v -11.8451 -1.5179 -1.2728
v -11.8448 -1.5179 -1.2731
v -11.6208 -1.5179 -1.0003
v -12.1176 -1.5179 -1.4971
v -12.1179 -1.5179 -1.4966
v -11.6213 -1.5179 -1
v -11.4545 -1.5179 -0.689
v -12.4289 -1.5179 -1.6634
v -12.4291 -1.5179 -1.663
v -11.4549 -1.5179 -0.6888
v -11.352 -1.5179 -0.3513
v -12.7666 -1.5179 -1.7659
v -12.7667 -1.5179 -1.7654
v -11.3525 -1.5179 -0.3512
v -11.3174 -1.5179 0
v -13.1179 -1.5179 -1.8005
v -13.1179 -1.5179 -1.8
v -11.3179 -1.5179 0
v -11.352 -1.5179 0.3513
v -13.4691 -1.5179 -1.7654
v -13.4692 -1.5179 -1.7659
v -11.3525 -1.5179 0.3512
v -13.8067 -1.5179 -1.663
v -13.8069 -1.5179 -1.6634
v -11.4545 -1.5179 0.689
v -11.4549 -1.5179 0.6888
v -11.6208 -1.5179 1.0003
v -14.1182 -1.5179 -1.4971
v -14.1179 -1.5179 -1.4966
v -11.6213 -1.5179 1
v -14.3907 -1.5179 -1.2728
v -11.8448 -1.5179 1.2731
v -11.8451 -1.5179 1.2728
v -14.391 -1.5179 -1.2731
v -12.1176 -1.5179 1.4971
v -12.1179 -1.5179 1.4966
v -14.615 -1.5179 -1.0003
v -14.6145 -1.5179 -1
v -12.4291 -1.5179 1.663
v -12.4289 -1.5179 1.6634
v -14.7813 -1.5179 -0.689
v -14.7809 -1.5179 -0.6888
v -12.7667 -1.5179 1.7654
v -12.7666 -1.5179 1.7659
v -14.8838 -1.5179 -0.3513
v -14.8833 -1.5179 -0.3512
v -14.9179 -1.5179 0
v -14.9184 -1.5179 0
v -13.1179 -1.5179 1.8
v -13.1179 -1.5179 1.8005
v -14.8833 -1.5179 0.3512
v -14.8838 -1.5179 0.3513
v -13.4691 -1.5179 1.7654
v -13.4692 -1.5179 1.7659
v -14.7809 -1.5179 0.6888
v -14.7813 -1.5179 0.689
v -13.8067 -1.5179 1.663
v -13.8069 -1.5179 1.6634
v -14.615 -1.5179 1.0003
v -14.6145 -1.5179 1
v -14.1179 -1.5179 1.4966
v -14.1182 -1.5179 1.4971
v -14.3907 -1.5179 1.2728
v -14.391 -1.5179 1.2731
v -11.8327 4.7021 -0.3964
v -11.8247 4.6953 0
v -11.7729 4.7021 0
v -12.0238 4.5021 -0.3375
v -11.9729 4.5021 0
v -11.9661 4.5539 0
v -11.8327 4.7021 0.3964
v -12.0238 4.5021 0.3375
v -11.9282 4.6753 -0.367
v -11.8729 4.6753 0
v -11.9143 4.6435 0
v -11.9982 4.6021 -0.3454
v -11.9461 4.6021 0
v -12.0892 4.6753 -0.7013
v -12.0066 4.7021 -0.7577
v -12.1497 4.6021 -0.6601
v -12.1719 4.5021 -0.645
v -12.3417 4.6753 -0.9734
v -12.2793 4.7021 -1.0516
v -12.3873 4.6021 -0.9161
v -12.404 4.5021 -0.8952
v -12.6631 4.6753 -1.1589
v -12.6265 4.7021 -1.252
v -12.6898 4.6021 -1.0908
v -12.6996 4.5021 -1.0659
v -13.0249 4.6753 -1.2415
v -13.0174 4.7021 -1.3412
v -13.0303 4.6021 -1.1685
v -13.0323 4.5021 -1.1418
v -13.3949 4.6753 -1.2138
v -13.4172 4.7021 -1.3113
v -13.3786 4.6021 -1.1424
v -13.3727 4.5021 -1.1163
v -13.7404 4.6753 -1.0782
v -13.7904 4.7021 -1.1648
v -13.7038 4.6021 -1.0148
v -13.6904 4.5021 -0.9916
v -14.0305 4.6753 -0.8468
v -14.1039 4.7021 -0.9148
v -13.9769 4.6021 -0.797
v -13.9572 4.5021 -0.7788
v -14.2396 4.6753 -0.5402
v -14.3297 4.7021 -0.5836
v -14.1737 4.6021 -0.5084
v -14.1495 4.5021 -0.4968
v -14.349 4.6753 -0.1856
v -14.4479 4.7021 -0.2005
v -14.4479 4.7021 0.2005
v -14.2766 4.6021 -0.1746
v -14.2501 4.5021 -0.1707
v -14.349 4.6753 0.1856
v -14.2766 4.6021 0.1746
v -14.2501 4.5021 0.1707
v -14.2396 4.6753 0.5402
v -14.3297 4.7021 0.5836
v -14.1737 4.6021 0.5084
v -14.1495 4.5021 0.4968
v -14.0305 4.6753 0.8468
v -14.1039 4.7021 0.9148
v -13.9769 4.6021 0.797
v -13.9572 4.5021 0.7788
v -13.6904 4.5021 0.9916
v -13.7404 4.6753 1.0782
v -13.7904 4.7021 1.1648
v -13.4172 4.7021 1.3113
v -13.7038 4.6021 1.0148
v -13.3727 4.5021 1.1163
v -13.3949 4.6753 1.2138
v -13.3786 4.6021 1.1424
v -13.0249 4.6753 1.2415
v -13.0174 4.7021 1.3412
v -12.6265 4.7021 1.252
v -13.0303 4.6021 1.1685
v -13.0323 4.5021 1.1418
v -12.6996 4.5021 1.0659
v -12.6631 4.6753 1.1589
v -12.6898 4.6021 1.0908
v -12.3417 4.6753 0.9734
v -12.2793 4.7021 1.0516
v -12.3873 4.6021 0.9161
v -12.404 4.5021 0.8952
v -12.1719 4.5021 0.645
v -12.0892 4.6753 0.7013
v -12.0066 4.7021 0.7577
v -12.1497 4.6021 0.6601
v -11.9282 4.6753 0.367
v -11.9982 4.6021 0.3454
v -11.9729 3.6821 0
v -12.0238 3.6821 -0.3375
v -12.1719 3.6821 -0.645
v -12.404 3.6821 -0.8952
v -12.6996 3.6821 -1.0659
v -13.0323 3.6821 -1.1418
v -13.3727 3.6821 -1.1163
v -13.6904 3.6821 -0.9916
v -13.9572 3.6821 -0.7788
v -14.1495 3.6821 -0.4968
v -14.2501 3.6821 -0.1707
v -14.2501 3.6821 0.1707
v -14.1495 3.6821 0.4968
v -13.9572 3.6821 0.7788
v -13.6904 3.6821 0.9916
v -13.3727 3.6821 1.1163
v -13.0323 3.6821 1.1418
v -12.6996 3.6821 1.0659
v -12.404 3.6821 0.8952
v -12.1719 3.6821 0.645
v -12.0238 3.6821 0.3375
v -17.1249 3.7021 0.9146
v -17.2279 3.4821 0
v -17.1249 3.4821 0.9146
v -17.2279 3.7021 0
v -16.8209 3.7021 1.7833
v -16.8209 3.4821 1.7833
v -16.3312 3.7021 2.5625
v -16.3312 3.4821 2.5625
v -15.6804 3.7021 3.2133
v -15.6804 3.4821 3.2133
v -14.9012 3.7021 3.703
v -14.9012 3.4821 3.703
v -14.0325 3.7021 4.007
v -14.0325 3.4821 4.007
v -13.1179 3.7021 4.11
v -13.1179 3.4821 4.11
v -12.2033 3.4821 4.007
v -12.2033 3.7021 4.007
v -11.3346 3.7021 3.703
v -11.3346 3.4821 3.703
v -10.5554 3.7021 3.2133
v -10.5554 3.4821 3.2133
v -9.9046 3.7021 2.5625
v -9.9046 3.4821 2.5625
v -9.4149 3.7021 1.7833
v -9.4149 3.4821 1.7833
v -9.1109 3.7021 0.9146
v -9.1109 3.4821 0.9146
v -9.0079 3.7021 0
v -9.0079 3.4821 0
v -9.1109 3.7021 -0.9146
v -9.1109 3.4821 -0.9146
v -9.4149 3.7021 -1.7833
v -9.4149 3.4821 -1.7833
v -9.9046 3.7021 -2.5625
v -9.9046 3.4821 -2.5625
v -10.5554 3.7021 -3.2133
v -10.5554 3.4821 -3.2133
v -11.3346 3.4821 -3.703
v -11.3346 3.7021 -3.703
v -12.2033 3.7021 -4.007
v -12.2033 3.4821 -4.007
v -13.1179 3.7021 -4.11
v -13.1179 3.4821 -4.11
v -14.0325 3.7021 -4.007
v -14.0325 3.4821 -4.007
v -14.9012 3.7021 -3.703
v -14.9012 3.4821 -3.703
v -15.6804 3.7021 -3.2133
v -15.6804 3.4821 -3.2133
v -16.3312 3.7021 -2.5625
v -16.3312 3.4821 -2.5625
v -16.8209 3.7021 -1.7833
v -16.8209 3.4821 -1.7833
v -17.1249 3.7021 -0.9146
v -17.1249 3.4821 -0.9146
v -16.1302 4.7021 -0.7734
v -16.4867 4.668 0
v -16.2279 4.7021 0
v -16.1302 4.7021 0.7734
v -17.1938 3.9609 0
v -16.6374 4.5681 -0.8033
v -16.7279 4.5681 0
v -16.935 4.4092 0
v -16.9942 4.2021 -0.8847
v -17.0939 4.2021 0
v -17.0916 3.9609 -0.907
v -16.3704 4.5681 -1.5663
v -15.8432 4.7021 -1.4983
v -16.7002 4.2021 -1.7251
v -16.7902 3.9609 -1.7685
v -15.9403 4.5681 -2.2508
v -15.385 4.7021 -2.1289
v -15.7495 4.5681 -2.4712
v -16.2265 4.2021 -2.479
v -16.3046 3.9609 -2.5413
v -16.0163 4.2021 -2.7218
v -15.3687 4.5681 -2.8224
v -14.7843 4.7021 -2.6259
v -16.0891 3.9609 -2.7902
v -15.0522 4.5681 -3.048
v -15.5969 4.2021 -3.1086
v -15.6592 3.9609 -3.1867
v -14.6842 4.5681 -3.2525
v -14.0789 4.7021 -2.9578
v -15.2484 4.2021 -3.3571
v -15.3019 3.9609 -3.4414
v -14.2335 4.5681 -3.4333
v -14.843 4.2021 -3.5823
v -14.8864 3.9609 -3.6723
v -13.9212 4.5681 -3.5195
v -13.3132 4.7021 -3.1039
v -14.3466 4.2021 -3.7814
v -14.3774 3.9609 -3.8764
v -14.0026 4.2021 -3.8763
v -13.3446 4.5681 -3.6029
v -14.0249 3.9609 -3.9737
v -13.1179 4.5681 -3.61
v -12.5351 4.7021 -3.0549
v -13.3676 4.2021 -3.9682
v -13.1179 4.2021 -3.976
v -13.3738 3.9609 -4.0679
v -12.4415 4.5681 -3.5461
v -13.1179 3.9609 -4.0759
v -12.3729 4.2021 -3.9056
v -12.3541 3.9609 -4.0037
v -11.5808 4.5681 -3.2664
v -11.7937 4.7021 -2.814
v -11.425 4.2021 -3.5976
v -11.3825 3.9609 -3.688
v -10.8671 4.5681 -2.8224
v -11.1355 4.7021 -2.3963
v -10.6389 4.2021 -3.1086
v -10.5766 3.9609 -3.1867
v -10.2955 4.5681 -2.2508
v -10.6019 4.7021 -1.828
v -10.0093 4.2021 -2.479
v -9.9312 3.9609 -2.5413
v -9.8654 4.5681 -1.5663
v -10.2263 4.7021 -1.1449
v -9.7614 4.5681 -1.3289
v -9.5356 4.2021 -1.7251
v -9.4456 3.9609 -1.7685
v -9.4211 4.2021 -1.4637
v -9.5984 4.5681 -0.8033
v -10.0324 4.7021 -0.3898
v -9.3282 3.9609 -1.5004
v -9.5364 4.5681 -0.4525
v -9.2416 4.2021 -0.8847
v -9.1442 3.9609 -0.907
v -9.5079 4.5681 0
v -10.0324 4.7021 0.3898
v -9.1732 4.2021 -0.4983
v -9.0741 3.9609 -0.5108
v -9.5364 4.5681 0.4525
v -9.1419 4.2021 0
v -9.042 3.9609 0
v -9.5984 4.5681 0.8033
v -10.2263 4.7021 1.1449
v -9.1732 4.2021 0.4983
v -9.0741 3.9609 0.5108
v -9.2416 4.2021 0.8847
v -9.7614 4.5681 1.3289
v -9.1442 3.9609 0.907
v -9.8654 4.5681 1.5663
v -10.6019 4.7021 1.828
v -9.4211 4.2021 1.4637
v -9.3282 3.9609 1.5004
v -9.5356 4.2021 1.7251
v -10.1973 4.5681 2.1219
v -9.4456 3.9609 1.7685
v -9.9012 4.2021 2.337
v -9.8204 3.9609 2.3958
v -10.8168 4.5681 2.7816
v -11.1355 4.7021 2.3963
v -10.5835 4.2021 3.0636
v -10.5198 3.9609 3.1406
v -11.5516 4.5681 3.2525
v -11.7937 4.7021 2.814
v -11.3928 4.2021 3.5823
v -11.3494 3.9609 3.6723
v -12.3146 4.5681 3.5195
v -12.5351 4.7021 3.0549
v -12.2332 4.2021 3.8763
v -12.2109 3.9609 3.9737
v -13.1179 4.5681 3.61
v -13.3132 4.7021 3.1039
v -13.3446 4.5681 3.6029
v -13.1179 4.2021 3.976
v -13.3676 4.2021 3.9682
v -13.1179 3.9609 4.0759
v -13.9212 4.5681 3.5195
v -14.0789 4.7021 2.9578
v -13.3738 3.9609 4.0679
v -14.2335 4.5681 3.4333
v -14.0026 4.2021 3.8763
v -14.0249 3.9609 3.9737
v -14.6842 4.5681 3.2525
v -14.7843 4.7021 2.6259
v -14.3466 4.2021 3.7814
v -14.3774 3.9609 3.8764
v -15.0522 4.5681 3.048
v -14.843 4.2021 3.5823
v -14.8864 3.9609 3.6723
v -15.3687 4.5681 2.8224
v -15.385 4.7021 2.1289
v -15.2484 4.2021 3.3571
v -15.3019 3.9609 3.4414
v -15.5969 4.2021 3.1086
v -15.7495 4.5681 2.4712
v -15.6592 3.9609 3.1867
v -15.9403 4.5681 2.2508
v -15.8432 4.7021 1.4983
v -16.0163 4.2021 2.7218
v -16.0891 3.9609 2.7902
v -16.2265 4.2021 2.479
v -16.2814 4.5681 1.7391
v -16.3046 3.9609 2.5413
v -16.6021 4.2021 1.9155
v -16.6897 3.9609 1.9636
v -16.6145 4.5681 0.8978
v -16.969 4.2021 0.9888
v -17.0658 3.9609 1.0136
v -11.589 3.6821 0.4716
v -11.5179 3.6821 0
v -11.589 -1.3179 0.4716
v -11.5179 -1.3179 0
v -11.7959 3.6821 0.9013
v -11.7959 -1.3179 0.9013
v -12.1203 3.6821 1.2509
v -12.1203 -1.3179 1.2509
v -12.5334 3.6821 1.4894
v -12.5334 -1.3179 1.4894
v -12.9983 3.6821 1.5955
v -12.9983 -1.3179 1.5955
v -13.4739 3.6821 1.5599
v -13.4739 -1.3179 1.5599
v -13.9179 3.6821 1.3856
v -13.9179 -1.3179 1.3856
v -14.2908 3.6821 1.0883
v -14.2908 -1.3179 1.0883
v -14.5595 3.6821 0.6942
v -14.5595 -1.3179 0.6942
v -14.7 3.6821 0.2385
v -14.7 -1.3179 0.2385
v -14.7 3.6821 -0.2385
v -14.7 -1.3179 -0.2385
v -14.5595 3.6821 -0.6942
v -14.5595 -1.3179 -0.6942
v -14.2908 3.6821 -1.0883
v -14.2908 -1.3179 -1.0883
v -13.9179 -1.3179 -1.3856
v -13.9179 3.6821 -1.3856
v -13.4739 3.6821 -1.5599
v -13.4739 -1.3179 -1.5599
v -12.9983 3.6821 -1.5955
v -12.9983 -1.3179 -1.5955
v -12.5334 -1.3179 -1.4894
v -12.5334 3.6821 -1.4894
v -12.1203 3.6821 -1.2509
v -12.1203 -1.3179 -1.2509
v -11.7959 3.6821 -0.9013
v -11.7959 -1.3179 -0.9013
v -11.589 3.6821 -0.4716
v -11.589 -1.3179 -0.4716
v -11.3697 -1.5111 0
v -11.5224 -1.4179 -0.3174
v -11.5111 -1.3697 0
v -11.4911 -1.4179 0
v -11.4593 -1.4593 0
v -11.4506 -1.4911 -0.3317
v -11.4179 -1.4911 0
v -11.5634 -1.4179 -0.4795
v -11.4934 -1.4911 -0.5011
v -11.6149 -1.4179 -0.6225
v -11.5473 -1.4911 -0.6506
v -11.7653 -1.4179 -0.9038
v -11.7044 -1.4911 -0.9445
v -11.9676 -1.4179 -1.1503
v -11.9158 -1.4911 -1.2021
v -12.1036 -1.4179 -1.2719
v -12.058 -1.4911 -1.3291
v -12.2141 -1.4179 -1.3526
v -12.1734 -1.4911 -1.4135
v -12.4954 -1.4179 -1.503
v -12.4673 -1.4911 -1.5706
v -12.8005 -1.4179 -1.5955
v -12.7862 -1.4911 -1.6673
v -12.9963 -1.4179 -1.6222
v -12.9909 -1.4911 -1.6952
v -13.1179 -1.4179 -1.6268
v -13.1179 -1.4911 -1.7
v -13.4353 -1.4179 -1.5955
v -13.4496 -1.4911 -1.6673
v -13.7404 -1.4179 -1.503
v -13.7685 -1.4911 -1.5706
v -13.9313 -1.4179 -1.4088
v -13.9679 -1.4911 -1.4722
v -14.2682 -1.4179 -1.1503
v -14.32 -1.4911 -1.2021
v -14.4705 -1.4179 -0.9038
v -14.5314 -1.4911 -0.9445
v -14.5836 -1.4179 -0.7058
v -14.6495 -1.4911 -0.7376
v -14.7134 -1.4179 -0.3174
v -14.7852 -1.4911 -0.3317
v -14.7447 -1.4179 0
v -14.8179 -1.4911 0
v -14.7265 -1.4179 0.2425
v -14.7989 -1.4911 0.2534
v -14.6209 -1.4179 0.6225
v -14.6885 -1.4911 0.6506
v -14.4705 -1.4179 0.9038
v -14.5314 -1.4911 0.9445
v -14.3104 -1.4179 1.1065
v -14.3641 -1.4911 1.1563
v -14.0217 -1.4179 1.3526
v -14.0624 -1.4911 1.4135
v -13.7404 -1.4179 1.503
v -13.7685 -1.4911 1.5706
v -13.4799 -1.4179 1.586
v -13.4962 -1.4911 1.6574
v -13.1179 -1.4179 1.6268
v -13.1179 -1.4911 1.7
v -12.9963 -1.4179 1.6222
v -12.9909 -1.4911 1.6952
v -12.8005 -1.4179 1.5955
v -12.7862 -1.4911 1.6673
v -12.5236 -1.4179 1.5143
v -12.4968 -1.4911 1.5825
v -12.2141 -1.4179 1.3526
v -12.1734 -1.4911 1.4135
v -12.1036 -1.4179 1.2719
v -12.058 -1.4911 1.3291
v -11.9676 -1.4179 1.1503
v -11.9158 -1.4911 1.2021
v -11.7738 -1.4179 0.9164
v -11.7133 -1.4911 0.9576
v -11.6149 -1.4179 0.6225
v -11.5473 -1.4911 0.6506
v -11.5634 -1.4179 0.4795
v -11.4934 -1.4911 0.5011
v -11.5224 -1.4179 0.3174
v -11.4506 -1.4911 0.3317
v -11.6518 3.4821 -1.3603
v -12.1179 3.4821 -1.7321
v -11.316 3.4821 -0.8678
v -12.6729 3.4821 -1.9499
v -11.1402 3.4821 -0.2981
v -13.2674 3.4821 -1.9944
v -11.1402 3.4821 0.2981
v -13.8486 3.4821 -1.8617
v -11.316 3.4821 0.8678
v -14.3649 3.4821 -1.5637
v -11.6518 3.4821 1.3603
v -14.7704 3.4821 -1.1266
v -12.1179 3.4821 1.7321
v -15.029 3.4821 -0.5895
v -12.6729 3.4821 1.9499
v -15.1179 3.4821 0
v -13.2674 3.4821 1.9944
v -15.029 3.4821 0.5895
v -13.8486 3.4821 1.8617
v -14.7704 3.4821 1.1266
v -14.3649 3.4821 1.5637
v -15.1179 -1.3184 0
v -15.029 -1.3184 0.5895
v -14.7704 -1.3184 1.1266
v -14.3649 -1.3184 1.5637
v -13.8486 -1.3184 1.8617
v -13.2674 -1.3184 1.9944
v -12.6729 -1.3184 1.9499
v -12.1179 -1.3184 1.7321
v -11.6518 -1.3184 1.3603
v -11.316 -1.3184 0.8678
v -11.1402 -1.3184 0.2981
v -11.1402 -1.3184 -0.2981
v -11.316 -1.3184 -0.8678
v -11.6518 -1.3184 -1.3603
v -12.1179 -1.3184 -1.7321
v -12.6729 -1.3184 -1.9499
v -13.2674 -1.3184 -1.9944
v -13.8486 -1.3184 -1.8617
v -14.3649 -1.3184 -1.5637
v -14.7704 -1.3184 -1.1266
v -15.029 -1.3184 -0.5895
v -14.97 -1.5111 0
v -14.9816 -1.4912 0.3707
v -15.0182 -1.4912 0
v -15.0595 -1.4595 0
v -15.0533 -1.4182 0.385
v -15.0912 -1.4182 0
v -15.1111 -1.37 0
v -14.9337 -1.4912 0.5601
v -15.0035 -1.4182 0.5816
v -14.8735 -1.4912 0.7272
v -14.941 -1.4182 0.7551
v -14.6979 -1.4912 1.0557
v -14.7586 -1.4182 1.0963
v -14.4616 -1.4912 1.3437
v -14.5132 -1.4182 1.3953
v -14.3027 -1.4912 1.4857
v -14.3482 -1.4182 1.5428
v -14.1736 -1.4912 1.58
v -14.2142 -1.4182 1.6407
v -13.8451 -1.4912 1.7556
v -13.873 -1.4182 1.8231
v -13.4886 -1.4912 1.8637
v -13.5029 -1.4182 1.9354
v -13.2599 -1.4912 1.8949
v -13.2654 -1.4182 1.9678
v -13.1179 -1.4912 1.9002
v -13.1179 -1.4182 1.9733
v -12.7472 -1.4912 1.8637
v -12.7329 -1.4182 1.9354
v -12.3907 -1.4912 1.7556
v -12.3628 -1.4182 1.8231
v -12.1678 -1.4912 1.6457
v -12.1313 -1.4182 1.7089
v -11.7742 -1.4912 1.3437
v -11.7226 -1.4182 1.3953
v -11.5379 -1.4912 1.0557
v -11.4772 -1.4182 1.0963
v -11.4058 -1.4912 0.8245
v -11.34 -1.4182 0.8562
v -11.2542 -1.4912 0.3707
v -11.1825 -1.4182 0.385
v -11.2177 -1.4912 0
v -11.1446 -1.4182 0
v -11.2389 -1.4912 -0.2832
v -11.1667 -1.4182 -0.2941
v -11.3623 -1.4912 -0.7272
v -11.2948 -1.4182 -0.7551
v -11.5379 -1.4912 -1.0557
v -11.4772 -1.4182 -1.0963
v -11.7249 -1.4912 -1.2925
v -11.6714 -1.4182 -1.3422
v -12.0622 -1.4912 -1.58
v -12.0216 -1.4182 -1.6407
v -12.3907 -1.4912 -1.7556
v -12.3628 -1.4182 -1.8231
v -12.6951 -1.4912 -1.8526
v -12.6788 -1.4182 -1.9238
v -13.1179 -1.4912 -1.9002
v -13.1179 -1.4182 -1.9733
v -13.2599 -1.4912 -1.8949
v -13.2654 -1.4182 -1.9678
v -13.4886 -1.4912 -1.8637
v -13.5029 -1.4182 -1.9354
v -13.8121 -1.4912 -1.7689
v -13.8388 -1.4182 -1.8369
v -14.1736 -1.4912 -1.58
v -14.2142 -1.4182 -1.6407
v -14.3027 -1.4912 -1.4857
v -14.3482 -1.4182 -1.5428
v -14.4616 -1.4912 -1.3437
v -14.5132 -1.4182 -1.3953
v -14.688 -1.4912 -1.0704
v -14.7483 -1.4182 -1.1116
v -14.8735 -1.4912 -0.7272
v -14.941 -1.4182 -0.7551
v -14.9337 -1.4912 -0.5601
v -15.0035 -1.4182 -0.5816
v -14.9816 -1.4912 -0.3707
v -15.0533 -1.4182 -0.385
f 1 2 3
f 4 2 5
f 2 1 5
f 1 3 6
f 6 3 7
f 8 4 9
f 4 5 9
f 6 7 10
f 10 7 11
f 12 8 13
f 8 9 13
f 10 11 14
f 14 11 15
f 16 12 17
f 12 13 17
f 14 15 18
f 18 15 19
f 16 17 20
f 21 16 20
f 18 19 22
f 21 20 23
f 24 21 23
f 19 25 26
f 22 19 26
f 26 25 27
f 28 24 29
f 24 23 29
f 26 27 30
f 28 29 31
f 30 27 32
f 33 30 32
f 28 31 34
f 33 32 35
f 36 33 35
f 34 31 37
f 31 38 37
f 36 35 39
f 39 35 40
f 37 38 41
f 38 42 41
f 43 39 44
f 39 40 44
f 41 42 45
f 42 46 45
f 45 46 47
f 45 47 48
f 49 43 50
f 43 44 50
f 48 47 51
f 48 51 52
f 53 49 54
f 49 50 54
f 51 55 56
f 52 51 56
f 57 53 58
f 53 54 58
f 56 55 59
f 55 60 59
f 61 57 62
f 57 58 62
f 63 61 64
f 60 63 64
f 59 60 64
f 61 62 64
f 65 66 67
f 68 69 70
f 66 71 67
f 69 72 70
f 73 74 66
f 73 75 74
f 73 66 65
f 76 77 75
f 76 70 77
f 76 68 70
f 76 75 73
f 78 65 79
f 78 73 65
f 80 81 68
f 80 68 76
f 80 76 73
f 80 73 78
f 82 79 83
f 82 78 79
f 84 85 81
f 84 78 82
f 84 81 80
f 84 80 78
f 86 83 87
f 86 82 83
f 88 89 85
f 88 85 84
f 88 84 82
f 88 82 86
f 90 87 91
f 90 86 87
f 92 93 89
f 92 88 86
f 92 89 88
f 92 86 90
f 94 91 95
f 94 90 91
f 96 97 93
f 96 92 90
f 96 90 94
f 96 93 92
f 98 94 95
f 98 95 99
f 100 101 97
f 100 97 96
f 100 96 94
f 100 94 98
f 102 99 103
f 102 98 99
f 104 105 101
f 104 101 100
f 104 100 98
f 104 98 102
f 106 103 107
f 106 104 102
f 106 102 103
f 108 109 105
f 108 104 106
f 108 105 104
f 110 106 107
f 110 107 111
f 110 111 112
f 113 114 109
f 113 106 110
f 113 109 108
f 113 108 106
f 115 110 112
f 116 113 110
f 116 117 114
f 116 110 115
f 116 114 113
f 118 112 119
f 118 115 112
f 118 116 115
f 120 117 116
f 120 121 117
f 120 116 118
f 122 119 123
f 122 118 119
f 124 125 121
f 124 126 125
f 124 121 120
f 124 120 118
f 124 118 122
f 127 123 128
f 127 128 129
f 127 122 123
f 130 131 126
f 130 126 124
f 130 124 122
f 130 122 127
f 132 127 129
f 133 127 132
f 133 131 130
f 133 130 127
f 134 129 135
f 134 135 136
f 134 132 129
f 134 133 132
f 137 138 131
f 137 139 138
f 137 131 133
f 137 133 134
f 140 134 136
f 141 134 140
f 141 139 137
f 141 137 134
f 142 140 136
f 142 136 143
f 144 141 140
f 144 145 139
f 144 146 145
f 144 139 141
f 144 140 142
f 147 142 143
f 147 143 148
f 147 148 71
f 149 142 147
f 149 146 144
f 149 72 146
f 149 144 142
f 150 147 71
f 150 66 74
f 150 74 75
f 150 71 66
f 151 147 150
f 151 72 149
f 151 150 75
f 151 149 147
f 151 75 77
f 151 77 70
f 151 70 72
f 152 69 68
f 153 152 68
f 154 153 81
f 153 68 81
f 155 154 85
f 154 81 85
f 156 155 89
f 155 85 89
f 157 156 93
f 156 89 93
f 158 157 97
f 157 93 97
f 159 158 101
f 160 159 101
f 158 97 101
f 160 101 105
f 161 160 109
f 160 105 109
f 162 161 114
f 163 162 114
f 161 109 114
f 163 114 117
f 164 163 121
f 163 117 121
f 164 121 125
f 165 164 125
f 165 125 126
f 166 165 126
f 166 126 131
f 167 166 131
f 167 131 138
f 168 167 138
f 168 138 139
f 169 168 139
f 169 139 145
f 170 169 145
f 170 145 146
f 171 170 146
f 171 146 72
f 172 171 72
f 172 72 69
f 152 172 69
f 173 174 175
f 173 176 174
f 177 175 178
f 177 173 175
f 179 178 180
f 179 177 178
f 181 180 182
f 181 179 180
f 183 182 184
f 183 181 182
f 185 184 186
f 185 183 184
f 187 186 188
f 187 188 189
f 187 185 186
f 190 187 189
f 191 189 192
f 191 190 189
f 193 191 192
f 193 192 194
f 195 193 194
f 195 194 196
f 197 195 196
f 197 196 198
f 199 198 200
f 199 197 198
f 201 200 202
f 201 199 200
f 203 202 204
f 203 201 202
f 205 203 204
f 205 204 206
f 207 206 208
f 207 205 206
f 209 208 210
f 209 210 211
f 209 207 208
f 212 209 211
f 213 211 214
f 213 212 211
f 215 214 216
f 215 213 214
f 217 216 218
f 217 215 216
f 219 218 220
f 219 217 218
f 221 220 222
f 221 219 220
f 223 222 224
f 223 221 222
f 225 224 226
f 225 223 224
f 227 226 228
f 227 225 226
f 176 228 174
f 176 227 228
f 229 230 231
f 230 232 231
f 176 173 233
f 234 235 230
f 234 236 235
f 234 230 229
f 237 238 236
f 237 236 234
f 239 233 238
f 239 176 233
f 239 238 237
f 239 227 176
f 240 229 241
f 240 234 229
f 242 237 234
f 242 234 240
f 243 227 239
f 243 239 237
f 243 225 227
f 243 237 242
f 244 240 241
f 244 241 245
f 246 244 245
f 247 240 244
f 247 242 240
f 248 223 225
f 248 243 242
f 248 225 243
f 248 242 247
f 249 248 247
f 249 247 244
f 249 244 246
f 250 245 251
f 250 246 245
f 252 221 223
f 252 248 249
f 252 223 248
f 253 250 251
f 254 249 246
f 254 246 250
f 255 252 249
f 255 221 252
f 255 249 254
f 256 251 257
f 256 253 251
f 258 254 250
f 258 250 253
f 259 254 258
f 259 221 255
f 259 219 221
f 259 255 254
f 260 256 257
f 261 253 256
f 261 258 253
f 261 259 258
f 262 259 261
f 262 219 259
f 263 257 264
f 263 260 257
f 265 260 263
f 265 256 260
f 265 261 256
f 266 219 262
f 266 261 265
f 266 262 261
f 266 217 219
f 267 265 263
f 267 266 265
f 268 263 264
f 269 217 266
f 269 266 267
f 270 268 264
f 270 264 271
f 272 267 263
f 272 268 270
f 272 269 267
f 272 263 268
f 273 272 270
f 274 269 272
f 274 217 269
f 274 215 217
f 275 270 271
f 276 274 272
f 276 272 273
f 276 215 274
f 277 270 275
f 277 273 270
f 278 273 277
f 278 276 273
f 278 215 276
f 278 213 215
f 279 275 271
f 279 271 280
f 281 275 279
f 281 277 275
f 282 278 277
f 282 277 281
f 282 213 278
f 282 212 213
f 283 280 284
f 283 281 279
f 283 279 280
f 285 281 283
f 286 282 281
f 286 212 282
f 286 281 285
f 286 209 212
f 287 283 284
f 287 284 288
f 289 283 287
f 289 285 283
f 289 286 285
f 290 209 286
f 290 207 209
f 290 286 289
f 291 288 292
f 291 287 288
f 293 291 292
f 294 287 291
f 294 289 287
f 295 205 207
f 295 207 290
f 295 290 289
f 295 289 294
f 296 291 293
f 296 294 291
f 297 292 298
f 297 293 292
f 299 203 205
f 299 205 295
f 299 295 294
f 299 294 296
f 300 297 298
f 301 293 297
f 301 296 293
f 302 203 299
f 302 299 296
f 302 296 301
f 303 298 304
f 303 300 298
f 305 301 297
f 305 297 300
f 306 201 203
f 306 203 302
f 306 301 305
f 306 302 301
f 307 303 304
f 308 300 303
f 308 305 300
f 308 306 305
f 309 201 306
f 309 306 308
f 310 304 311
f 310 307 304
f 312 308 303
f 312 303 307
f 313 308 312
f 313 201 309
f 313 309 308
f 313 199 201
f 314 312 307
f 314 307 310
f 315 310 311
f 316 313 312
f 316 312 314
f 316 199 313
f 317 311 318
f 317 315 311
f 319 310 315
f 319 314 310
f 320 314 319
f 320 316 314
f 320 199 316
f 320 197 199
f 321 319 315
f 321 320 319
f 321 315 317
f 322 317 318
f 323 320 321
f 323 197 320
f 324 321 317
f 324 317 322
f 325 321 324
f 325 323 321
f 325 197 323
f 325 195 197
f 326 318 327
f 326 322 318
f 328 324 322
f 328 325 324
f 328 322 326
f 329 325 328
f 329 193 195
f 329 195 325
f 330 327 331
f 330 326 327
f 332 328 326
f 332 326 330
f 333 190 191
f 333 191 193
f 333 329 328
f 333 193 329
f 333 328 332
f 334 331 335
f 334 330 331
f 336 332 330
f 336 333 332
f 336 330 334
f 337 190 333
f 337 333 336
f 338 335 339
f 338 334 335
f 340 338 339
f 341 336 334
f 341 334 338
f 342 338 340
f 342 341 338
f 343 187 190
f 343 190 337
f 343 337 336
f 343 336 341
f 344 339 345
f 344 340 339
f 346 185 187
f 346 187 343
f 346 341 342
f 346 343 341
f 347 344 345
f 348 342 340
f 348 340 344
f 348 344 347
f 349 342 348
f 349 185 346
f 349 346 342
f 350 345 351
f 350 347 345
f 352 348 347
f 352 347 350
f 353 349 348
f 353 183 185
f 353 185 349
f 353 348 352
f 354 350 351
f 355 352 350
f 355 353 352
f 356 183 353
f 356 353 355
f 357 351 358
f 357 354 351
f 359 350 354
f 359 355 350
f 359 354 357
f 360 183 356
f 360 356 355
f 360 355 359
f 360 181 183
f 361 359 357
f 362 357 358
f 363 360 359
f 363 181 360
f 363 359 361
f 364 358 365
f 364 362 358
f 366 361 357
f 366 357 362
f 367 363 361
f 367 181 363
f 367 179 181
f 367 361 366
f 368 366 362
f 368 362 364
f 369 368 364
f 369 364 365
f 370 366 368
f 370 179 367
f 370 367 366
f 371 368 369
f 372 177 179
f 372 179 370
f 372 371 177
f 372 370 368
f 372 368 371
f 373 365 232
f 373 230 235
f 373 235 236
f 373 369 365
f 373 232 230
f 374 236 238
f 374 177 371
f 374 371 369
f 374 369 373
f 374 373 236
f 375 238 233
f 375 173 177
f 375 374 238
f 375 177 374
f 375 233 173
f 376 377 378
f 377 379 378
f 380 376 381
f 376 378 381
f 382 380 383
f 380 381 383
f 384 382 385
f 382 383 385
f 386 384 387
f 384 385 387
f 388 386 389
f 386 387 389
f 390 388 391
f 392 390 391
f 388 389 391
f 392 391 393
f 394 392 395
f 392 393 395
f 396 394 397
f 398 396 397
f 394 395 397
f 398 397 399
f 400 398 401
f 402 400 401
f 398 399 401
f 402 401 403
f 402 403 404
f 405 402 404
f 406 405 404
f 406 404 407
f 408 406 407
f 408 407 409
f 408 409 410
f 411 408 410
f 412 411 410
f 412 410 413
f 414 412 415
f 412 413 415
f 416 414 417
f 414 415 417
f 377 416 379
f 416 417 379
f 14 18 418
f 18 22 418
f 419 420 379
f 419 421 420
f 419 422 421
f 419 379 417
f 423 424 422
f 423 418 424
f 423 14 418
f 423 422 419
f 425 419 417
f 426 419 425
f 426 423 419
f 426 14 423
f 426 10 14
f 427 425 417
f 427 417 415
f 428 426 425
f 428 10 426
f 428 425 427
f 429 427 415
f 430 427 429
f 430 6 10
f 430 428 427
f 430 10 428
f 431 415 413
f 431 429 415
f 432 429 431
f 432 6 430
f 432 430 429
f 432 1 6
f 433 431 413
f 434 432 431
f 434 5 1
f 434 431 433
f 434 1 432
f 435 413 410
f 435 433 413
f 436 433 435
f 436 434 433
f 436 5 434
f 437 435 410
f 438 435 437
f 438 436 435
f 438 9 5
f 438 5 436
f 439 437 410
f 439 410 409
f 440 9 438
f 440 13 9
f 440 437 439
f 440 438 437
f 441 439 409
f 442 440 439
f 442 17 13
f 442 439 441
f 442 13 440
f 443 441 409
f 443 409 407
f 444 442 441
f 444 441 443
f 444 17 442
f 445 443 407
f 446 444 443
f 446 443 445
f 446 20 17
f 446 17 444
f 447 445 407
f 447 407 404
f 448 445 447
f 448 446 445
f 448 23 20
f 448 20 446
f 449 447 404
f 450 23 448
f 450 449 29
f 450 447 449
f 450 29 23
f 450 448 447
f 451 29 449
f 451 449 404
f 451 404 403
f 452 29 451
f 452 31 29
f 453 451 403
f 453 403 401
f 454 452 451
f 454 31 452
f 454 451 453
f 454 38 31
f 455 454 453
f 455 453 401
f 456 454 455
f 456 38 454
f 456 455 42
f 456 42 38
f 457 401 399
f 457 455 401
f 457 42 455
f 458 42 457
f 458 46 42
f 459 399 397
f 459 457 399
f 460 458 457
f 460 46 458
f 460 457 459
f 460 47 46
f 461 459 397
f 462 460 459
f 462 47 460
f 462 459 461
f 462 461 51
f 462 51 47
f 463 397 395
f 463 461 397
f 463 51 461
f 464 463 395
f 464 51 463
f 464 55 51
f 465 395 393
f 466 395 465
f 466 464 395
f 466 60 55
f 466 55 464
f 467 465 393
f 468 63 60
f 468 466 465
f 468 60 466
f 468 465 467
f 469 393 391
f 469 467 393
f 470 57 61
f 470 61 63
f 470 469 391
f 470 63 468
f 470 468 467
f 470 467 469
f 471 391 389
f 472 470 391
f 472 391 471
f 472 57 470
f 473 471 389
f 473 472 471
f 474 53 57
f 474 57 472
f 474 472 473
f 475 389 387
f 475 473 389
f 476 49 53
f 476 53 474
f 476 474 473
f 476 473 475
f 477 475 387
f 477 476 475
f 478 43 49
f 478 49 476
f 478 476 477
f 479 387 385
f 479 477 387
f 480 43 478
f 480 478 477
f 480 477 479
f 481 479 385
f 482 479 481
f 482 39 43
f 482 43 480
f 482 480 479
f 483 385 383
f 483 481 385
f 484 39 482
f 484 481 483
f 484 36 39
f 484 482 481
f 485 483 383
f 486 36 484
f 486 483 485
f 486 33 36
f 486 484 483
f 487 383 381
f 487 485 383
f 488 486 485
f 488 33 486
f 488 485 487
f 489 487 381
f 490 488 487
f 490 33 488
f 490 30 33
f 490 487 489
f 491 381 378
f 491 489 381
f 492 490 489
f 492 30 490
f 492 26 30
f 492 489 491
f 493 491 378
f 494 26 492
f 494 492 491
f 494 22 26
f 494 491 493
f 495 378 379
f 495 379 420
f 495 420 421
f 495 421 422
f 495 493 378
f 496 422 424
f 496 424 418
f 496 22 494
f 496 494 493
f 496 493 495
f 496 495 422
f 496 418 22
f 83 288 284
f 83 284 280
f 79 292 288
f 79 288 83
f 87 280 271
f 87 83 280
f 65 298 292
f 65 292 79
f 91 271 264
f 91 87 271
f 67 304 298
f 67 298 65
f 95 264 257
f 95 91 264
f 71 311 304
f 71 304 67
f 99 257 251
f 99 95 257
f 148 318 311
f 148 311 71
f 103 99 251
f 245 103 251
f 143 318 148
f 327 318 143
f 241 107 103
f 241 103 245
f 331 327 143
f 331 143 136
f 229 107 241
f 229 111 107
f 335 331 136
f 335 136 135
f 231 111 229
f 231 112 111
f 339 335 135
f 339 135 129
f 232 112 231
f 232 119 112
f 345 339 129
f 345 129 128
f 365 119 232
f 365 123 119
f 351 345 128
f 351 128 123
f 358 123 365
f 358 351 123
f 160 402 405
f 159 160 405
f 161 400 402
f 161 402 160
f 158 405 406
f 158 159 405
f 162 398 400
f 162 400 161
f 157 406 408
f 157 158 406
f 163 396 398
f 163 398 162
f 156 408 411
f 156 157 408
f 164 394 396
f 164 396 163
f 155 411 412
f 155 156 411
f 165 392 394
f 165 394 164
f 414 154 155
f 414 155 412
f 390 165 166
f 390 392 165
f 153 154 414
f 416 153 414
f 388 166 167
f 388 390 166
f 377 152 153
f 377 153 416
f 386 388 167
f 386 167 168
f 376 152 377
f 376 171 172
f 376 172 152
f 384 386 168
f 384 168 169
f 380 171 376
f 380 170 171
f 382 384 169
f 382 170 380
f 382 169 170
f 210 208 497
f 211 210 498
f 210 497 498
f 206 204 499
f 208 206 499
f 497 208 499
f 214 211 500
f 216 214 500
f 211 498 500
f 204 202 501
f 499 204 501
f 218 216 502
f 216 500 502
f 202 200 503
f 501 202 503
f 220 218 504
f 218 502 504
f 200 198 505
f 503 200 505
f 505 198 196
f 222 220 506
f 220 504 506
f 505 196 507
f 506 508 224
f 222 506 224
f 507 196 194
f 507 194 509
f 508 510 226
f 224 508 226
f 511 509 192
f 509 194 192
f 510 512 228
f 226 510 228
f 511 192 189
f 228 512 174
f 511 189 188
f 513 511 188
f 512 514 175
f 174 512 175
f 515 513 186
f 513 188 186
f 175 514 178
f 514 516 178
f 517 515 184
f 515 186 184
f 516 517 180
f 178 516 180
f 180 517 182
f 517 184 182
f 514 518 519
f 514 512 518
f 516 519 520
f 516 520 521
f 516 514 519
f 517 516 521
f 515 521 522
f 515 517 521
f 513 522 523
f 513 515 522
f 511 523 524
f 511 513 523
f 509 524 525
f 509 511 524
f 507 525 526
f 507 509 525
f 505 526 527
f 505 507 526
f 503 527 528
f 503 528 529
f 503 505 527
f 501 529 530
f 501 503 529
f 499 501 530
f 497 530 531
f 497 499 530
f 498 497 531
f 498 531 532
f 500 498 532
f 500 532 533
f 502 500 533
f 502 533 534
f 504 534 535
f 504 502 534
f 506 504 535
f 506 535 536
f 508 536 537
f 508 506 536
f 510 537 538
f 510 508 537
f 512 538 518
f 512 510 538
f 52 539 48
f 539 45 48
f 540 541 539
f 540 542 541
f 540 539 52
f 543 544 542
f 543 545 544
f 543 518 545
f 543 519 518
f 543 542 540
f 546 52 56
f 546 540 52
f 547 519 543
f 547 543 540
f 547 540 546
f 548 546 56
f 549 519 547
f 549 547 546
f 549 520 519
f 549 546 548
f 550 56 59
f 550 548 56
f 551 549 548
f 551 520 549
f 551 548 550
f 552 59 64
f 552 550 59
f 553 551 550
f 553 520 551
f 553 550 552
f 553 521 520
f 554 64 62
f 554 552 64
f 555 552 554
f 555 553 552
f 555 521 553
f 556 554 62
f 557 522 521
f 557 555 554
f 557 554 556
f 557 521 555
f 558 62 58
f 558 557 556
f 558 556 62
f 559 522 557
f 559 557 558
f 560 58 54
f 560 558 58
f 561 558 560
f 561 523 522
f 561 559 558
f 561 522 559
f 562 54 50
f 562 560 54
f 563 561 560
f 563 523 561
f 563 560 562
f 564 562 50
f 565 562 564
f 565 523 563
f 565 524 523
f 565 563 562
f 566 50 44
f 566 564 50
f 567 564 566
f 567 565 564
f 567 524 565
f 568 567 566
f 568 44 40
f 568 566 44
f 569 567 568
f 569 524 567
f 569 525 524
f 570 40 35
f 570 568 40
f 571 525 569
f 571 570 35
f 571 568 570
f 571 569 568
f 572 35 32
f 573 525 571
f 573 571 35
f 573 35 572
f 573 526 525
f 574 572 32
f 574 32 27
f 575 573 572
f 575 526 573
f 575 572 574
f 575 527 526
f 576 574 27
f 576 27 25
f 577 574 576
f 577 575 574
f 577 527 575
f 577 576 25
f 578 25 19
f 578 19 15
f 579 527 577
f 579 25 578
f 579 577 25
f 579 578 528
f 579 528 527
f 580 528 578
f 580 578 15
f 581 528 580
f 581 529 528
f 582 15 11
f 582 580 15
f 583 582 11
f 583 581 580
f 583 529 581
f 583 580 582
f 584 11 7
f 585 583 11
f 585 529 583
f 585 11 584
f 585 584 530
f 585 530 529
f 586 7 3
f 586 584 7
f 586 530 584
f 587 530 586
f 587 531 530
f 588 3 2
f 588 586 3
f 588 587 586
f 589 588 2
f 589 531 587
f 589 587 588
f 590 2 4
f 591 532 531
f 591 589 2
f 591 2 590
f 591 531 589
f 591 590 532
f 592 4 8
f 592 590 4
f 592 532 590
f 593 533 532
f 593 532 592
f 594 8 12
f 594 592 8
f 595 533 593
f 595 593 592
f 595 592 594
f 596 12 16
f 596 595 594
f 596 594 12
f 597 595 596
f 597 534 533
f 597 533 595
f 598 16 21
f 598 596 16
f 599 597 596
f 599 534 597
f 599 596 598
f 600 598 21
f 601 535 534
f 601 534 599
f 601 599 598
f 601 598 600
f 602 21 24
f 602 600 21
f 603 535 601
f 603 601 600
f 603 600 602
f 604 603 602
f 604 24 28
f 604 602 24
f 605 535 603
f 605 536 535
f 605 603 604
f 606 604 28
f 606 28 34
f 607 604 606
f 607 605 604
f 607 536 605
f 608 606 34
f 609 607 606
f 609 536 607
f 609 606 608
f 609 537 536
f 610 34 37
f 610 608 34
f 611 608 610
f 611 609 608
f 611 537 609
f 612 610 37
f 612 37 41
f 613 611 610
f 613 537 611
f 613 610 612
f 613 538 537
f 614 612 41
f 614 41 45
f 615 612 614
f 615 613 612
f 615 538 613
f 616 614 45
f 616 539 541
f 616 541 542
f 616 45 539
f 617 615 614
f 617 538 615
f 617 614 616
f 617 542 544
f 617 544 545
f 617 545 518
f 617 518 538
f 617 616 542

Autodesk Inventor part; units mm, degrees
ref_plane "YZ Plane" through (0, 0, 0) normal (1, 0, 0) x (0, 1, 0)
ref_plane "XZ Plane" through (0, 0, 0) normal (0, 1, 0) x (-1, 0, 0)
ref_plane "XY Plane" through (0, 0, 0) normal (0, 0, 1) x (1, 0, 0)
sketch "Sketch1" plane through (0, 0, 0) normal (0, 0, 1) x (1, 0, 0)
  line L0 (-17.2279, 3.4821) -> (-17.2279, 3.7021)
  line L1 (-13.1179, 4.7021) -> (-16.2279, 4.7021)
  arc A0 (-16.2279, 4.7021) -> (-17.2279, 3.7021) centre (-16.2279, 3.7021) ccw
  line L2 (-15.1179, -1.5179) -> (-13.1179, -1.5179)
  line L3 (-15.1179, -1.5179) -> (-15.1179, 3.4821)
  line L4 (-13.1179, -1.5179) -> (-13.1179, 4.7021)
  line L5 (-17.2279, 3.4821) -> (-13.1179, 3.4821)
  point P0 (-17.2279, 4.7021)
  dimension "d0" = 1.22
  dimension "d2" = 1
  dimension "d7" = 2
  dimension "d8" = 3.11
  dimension "d9" = 4.11
  dimension "d10" = 6.22
  dimension "d11" = 5
revolve "Revolution1" add sketch "Sketch1" angle 360 about axis through (-13.1179, -1.5179, 0) along (0, 1, 0)
sketch "Sketch2" plane through (-13.1179, 4.7021, 0) normal (0, 1, 0) x (1, 0, 0)
  circle A0 centre (0, 0) radius 1.145
  dimension "d13" = 2.29
extrude "Extrusion1" cut sketch "Sketch2" against normal blind 10
fillet "Fillet1" radius 0.2 1 edges at (-14.2629, 4.7021, 0)
sketch "Sketch3" plane through (-13.1179, -1.5179, 0) normal (0, -1, 0) x (1, 0, 0)
  circle A0 centre (0, 0) radius 1.6
  dimension "d17" = 3.2
extrude "Extrusion2" cut sketch "Sketch3" against normal blind 5.2
fillet "Fillet2" radius 0.2 1 edges at (-14.7179, -1.5179, 0)
fillet "Fillet3" radius 0.2 1 edges at (-11.1179, -1.5179, 0)
properties part number "Remache POP Abierto con Rotura de Vástago D4" material "Aluminum 7175 T73 0 Hot Formed"
